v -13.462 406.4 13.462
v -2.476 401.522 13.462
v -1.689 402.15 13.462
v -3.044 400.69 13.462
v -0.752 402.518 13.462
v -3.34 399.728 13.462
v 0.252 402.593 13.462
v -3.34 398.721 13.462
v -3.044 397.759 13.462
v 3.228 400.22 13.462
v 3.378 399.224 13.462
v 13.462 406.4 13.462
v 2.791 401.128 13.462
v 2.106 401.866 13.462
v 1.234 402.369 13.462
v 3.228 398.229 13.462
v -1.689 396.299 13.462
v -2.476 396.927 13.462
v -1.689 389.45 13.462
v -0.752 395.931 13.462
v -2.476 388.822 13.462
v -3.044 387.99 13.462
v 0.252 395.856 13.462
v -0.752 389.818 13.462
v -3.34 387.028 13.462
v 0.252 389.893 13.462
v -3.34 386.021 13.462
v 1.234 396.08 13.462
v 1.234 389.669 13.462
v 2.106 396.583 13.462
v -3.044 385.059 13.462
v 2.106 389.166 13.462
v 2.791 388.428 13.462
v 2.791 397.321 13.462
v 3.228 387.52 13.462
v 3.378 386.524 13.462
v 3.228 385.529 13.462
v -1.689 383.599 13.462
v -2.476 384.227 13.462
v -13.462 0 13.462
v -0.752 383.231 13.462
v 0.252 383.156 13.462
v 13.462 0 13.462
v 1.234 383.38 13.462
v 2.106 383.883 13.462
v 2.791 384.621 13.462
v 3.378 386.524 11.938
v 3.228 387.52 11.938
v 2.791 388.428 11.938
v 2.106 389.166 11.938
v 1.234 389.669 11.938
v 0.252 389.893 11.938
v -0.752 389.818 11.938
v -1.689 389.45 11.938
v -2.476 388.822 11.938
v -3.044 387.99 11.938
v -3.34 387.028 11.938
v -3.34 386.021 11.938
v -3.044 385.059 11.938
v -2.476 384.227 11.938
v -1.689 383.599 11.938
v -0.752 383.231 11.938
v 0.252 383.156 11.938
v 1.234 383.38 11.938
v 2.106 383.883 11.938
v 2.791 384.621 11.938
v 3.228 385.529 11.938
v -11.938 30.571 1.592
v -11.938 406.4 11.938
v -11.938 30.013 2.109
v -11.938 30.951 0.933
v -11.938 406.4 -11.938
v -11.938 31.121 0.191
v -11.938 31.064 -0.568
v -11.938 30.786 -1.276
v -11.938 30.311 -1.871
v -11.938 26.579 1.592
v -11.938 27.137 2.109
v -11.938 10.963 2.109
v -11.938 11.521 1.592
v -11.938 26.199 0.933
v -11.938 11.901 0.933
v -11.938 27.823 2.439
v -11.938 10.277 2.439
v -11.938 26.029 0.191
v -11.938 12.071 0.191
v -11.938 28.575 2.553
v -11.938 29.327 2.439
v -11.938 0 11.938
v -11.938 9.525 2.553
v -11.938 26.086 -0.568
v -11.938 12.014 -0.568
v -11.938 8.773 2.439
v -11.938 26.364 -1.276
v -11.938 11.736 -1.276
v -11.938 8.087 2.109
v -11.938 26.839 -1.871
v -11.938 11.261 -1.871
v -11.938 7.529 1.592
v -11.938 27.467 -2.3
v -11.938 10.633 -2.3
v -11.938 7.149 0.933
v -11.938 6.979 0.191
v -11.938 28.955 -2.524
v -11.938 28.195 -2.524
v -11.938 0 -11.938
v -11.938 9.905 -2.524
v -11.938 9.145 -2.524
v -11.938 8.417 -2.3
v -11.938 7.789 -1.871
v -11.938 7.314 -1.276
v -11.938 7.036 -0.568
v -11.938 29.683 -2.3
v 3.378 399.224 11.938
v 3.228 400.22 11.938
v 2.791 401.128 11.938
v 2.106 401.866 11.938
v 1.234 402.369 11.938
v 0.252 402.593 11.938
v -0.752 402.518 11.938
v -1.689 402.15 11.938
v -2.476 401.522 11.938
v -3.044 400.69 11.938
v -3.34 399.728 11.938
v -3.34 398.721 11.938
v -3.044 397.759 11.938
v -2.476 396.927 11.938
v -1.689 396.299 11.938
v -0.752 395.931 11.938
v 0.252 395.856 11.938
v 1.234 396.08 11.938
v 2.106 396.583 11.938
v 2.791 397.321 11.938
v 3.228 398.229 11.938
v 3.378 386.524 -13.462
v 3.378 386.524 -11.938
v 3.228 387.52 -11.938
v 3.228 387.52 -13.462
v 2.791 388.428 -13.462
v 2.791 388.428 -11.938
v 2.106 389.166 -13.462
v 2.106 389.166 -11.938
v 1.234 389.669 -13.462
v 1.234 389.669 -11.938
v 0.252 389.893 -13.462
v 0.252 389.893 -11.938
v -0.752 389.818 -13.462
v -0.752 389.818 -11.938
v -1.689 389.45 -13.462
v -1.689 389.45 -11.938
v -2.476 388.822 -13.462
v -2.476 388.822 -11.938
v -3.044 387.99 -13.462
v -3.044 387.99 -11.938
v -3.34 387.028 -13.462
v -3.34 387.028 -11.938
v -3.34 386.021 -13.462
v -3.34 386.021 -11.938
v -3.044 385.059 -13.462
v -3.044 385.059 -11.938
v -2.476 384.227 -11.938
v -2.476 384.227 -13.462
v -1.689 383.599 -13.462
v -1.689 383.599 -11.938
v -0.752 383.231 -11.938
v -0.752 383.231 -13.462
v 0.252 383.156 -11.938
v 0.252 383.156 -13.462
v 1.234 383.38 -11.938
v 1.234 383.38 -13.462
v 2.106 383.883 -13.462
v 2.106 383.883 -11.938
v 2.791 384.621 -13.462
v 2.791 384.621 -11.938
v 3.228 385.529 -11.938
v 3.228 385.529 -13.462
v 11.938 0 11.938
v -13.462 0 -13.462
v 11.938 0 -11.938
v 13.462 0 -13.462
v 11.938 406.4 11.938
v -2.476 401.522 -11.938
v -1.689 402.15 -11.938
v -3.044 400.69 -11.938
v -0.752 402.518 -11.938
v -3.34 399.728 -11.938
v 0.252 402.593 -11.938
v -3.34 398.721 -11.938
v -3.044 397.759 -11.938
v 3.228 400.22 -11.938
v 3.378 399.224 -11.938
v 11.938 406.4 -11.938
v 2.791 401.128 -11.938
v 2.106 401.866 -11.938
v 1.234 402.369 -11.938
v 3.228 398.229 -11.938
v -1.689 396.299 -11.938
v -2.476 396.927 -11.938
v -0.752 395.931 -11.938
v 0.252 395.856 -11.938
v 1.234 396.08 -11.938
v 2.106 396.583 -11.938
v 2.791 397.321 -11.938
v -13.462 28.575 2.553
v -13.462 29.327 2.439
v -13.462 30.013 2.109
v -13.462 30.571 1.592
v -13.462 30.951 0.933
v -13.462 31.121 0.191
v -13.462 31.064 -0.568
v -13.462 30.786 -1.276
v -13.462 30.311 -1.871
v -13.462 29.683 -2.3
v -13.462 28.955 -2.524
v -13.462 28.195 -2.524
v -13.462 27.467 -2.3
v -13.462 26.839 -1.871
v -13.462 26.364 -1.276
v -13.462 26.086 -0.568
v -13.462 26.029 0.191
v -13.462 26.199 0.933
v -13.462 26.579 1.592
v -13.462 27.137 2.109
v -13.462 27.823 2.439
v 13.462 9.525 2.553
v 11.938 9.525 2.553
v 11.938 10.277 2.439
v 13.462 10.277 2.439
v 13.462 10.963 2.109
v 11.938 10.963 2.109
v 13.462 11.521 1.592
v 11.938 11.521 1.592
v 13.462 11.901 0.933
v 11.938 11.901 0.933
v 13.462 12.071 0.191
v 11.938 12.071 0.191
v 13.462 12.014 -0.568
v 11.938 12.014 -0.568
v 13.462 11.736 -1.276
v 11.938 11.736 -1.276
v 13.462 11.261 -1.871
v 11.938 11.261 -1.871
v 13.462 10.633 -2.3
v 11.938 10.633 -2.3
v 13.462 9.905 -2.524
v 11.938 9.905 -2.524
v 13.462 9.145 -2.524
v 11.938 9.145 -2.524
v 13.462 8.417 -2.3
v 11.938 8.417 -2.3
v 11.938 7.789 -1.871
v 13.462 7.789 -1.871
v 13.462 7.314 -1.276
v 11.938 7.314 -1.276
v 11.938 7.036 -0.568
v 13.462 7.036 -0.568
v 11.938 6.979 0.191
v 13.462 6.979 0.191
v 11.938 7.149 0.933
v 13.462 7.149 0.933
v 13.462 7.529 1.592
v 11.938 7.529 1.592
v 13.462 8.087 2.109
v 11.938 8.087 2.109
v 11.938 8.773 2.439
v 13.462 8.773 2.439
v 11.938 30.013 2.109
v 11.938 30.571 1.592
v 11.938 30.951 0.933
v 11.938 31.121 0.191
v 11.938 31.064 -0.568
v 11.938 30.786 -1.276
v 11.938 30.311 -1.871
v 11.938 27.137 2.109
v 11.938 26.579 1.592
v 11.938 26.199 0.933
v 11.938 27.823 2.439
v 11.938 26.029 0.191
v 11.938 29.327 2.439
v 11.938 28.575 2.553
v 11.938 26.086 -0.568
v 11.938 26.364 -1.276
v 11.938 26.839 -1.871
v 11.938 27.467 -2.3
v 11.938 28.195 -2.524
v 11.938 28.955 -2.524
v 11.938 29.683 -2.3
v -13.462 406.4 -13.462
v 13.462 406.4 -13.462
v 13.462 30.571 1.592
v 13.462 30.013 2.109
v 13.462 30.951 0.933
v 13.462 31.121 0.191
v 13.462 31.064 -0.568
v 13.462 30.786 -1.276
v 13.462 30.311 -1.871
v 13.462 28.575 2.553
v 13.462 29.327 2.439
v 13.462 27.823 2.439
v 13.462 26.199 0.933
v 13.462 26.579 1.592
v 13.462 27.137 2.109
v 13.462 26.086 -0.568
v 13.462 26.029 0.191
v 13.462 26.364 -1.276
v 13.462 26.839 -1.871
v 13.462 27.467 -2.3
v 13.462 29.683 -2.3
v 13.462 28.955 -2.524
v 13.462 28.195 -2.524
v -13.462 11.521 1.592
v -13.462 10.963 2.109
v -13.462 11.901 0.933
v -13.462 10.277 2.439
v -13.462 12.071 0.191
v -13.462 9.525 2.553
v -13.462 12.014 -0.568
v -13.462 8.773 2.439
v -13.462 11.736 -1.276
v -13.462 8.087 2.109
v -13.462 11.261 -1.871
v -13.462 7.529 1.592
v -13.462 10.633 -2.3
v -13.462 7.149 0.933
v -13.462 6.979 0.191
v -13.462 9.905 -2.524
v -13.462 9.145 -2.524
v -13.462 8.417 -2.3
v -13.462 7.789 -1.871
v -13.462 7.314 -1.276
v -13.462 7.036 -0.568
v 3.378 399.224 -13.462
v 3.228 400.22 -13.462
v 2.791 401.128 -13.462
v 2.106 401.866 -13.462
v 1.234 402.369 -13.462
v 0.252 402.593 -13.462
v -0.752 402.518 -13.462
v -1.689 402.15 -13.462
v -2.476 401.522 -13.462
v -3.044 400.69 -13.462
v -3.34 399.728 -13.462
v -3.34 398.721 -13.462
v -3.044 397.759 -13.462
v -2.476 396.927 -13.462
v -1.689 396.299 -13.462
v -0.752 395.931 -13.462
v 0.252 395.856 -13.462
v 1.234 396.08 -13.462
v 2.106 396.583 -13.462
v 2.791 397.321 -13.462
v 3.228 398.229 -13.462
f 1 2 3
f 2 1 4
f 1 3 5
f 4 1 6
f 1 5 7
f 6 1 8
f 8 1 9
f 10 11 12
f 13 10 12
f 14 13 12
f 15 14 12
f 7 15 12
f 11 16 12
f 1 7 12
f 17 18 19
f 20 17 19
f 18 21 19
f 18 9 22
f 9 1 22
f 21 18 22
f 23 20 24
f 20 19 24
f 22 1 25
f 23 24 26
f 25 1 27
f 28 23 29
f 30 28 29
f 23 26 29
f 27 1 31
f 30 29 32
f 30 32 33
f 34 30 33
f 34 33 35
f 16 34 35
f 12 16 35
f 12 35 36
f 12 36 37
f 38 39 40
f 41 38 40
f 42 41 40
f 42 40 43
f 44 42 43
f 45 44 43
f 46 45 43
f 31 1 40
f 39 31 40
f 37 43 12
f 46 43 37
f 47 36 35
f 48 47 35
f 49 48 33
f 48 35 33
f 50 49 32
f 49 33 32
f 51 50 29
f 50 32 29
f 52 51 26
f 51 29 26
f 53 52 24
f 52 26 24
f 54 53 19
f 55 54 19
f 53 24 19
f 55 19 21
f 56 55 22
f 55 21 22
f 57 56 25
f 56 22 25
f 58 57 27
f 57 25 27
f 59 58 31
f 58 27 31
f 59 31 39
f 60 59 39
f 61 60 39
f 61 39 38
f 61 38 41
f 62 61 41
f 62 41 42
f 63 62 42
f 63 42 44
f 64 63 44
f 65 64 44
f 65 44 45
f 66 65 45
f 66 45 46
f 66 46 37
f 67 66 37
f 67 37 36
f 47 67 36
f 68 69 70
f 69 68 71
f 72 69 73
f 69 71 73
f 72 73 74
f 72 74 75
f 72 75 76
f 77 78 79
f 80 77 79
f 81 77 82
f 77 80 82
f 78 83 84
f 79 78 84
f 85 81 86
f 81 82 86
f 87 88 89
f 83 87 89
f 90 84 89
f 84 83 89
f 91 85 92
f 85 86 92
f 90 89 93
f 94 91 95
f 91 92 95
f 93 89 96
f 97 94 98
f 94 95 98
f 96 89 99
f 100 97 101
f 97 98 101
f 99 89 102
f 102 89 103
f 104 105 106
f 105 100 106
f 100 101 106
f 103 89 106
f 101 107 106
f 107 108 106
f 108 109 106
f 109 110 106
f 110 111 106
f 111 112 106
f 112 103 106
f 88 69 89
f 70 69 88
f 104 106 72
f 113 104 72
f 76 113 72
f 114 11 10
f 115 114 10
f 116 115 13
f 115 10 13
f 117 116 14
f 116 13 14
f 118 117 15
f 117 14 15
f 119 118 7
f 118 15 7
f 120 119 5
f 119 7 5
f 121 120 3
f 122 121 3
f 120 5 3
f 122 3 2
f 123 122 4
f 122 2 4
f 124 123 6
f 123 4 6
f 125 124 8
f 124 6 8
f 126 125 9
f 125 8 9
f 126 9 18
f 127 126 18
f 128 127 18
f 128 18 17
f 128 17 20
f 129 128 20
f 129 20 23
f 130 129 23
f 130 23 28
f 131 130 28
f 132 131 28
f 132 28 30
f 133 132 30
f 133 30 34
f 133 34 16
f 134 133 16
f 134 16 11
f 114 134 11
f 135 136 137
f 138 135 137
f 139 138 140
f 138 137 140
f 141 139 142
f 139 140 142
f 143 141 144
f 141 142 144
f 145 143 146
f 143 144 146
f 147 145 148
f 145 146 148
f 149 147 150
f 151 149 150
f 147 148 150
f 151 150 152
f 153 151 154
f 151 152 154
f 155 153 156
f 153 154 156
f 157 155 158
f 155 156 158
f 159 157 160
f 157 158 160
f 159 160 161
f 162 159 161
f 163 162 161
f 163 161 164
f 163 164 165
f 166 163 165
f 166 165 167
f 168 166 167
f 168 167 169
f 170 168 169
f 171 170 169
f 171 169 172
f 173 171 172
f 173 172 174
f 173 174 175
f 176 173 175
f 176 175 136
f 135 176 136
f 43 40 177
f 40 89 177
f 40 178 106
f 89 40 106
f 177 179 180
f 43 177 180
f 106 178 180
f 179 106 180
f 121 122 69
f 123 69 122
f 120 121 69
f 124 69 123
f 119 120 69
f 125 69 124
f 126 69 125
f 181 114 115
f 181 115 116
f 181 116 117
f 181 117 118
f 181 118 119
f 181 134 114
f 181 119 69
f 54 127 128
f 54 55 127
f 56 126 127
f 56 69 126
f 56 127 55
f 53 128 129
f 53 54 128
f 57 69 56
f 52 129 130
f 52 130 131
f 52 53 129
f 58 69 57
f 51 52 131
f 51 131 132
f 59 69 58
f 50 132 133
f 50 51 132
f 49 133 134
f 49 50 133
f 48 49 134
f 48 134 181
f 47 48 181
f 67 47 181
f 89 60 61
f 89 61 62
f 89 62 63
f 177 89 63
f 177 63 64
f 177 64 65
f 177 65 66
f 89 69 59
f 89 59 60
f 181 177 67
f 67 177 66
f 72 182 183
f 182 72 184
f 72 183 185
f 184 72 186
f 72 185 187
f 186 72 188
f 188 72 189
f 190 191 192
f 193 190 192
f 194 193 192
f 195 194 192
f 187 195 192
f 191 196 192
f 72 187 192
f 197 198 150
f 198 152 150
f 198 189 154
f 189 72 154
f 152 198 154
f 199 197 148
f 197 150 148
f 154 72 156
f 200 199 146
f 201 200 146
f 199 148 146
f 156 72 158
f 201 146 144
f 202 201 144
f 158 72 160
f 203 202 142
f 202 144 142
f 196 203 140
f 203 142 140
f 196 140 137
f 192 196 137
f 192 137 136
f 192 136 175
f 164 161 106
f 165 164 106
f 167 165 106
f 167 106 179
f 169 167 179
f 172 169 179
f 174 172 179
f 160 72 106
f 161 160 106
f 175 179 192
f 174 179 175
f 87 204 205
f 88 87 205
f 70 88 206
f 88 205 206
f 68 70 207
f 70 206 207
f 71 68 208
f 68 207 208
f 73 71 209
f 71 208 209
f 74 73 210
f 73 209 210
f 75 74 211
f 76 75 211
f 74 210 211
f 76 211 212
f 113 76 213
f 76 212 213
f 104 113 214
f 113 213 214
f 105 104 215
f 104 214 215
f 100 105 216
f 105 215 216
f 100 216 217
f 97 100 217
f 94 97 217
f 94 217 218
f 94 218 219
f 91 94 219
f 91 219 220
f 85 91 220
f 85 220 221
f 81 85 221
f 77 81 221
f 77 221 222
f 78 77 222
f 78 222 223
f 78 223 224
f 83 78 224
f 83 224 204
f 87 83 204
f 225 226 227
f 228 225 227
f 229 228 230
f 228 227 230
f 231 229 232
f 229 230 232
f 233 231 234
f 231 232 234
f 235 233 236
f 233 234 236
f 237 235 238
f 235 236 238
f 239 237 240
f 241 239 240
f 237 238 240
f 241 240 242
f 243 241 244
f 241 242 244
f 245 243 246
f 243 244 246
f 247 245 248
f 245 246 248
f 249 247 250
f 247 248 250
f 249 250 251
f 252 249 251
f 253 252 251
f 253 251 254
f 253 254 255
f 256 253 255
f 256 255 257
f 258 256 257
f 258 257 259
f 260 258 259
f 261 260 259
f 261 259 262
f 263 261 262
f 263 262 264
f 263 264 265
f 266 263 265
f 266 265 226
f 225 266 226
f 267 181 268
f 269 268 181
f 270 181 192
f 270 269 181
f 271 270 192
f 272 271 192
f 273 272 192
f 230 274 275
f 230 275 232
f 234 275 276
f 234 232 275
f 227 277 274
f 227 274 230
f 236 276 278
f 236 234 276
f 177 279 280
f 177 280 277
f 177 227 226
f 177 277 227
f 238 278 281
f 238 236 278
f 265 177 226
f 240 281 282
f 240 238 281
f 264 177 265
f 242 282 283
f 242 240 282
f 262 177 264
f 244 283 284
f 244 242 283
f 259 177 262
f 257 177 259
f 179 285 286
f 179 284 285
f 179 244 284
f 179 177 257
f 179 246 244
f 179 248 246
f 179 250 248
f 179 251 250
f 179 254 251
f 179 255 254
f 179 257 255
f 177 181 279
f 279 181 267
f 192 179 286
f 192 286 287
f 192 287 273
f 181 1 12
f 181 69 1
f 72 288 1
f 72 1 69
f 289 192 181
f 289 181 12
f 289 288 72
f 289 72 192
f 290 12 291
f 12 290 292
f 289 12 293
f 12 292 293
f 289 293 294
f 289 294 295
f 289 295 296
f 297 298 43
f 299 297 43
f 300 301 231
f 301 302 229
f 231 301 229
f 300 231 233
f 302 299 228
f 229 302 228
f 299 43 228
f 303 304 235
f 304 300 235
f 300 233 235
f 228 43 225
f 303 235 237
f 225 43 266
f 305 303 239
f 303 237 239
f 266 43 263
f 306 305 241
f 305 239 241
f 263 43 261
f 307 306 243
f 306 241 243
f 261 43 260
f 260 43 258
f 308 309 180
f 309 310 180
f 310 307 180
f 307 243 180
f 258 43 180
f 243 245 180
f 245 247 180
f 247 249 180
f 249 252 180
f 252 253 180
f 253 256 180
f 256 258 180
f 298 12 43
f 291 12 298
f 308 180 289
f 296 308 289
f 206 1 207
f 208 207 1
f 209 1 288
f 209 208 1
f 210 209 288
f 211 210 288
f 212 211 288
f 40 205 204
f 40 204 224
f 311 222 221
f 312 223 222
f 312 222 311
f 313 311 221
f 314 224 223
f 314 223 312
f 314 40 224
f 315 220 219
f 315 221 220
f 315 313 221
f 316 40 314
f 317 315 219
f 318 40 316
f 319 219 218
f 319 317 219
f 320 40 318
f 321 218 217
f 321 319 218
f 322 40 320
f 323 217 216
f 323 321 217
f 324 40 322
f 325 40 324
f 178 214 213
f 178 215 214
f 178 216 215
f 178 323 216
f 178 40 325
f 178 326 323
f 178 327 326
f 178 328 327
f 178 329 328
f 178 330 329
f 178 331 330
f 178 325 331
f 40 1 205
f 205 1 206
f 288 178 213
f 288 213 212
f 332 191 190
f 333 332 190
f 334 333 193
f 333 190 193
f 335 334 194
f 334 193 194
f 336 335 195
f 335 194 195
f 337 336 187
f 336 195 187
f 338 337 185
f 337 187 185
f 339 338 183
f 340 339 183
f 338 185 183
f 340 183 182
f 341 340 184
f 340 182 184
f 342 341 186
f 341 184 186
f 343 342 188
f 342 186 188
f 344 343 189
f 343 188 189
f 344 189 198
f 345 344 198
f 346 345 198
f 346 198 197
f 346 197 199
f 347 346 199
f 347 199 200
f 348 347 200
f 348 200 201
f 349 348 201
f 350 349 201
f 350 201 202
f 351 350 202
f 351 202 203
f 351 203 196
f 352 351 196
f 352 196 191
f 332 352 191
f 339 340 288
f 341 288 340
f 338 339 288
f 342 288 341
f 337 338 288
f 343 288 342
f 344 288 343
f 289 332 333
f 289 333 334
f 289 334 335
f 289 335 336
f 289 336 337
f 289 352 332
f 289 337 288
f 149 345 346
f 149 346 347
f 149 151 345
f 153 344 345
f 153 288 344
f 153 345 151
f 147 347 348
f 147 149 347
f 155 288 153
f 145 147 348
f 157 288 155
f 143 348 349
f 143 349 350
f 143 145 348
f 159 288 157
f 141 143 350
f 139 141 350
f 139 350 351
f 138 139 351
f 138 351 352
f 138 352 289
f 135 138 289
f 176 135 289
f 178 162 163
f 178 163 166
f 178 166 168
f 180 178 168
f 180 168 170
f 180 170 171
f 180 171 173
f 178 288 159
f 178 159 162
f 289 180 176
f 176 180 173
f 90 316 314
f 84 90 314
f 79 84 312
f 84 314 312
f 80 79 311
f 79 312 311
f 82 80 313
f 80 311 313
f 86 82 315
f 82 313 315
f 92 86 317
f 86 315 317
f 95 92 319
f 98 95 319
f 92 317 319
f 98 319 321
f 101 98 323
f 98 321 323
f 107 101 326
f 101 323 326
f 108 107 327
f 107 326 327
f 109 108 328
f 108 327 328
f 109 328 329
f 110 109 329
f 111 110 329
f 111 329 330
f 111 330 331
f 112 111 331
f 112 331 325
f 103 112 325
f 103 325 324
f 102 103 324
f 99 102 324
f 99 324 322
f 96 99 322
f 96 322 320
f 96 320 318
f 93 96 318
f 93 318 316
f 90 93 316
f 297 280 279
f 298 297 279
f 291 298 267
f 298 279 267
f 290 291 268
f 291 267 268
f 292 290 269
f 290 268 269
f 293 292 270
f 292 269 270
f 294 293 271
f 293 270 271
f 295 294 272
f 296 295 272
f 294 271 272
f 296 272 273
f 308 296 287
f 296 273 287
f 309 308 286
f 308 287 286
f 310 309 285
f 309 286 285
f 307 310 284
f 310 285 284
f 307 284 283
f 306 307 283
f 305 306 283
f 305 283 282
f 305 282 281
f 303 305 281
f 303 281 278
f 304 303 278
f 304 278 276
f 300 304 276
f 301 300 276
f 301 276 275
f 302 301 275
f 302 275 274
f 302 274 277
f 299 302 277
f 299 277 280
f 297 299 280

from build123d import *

# Parameters (mm, degrees)
SKETCH1_W               = 26.924
SKETCH1_H               = 26.924
SKETCH1_W_2             = 23.876
SKETCH1_H_2             = 23.876
EXTRUDE_THIN1_DEPTH     = 406.4
F_1_4_CLEARANCE_HOLE1_D = 6.7564
F_10_CLEARANCE_HOLE1_D  = 5.1054


with BuildPart() as part:
    # Sketch1 → Extrude-Thin1 (new body)
    with BuildSketch(Plane(origin=(0, 0, 0), x_dir=(1, 0, 0), z_dir=(0, 1, 0))):
        Rectangle(SKETCH1_W, SKETCH1_H)
        Rectangle(SKETCH1_W_2, SKETCH1_H_2, mode=Mode.SUBTRACT)
    extrude(amount=EXTRUDE_THIN1_DEPTH)

    # 1/4 Clearance Hole1 (through all)
    with Locations(Plane(origin=(0, 0, -13.462), x_dir=(-1, 0, 0), z_dir=(0, 0, -1))):
        with Locations((0, 399.2245), (0, 386.5245)):
            Hole(F_1_4_CLEARANCE_HOLE1_D / 2)

    # #10 Clearance Hole1 (through all)
    with Locations(Plane(origin=(13.462, 0, 0), x_dir=(0, 0, -1), z_dir=(1, 0, 0))):
        with Locations((0, 9.525), (0, 28.575)):
            Hole(F_10_CLEARANCE_HOLE1_D / 2)


solid = part.part
